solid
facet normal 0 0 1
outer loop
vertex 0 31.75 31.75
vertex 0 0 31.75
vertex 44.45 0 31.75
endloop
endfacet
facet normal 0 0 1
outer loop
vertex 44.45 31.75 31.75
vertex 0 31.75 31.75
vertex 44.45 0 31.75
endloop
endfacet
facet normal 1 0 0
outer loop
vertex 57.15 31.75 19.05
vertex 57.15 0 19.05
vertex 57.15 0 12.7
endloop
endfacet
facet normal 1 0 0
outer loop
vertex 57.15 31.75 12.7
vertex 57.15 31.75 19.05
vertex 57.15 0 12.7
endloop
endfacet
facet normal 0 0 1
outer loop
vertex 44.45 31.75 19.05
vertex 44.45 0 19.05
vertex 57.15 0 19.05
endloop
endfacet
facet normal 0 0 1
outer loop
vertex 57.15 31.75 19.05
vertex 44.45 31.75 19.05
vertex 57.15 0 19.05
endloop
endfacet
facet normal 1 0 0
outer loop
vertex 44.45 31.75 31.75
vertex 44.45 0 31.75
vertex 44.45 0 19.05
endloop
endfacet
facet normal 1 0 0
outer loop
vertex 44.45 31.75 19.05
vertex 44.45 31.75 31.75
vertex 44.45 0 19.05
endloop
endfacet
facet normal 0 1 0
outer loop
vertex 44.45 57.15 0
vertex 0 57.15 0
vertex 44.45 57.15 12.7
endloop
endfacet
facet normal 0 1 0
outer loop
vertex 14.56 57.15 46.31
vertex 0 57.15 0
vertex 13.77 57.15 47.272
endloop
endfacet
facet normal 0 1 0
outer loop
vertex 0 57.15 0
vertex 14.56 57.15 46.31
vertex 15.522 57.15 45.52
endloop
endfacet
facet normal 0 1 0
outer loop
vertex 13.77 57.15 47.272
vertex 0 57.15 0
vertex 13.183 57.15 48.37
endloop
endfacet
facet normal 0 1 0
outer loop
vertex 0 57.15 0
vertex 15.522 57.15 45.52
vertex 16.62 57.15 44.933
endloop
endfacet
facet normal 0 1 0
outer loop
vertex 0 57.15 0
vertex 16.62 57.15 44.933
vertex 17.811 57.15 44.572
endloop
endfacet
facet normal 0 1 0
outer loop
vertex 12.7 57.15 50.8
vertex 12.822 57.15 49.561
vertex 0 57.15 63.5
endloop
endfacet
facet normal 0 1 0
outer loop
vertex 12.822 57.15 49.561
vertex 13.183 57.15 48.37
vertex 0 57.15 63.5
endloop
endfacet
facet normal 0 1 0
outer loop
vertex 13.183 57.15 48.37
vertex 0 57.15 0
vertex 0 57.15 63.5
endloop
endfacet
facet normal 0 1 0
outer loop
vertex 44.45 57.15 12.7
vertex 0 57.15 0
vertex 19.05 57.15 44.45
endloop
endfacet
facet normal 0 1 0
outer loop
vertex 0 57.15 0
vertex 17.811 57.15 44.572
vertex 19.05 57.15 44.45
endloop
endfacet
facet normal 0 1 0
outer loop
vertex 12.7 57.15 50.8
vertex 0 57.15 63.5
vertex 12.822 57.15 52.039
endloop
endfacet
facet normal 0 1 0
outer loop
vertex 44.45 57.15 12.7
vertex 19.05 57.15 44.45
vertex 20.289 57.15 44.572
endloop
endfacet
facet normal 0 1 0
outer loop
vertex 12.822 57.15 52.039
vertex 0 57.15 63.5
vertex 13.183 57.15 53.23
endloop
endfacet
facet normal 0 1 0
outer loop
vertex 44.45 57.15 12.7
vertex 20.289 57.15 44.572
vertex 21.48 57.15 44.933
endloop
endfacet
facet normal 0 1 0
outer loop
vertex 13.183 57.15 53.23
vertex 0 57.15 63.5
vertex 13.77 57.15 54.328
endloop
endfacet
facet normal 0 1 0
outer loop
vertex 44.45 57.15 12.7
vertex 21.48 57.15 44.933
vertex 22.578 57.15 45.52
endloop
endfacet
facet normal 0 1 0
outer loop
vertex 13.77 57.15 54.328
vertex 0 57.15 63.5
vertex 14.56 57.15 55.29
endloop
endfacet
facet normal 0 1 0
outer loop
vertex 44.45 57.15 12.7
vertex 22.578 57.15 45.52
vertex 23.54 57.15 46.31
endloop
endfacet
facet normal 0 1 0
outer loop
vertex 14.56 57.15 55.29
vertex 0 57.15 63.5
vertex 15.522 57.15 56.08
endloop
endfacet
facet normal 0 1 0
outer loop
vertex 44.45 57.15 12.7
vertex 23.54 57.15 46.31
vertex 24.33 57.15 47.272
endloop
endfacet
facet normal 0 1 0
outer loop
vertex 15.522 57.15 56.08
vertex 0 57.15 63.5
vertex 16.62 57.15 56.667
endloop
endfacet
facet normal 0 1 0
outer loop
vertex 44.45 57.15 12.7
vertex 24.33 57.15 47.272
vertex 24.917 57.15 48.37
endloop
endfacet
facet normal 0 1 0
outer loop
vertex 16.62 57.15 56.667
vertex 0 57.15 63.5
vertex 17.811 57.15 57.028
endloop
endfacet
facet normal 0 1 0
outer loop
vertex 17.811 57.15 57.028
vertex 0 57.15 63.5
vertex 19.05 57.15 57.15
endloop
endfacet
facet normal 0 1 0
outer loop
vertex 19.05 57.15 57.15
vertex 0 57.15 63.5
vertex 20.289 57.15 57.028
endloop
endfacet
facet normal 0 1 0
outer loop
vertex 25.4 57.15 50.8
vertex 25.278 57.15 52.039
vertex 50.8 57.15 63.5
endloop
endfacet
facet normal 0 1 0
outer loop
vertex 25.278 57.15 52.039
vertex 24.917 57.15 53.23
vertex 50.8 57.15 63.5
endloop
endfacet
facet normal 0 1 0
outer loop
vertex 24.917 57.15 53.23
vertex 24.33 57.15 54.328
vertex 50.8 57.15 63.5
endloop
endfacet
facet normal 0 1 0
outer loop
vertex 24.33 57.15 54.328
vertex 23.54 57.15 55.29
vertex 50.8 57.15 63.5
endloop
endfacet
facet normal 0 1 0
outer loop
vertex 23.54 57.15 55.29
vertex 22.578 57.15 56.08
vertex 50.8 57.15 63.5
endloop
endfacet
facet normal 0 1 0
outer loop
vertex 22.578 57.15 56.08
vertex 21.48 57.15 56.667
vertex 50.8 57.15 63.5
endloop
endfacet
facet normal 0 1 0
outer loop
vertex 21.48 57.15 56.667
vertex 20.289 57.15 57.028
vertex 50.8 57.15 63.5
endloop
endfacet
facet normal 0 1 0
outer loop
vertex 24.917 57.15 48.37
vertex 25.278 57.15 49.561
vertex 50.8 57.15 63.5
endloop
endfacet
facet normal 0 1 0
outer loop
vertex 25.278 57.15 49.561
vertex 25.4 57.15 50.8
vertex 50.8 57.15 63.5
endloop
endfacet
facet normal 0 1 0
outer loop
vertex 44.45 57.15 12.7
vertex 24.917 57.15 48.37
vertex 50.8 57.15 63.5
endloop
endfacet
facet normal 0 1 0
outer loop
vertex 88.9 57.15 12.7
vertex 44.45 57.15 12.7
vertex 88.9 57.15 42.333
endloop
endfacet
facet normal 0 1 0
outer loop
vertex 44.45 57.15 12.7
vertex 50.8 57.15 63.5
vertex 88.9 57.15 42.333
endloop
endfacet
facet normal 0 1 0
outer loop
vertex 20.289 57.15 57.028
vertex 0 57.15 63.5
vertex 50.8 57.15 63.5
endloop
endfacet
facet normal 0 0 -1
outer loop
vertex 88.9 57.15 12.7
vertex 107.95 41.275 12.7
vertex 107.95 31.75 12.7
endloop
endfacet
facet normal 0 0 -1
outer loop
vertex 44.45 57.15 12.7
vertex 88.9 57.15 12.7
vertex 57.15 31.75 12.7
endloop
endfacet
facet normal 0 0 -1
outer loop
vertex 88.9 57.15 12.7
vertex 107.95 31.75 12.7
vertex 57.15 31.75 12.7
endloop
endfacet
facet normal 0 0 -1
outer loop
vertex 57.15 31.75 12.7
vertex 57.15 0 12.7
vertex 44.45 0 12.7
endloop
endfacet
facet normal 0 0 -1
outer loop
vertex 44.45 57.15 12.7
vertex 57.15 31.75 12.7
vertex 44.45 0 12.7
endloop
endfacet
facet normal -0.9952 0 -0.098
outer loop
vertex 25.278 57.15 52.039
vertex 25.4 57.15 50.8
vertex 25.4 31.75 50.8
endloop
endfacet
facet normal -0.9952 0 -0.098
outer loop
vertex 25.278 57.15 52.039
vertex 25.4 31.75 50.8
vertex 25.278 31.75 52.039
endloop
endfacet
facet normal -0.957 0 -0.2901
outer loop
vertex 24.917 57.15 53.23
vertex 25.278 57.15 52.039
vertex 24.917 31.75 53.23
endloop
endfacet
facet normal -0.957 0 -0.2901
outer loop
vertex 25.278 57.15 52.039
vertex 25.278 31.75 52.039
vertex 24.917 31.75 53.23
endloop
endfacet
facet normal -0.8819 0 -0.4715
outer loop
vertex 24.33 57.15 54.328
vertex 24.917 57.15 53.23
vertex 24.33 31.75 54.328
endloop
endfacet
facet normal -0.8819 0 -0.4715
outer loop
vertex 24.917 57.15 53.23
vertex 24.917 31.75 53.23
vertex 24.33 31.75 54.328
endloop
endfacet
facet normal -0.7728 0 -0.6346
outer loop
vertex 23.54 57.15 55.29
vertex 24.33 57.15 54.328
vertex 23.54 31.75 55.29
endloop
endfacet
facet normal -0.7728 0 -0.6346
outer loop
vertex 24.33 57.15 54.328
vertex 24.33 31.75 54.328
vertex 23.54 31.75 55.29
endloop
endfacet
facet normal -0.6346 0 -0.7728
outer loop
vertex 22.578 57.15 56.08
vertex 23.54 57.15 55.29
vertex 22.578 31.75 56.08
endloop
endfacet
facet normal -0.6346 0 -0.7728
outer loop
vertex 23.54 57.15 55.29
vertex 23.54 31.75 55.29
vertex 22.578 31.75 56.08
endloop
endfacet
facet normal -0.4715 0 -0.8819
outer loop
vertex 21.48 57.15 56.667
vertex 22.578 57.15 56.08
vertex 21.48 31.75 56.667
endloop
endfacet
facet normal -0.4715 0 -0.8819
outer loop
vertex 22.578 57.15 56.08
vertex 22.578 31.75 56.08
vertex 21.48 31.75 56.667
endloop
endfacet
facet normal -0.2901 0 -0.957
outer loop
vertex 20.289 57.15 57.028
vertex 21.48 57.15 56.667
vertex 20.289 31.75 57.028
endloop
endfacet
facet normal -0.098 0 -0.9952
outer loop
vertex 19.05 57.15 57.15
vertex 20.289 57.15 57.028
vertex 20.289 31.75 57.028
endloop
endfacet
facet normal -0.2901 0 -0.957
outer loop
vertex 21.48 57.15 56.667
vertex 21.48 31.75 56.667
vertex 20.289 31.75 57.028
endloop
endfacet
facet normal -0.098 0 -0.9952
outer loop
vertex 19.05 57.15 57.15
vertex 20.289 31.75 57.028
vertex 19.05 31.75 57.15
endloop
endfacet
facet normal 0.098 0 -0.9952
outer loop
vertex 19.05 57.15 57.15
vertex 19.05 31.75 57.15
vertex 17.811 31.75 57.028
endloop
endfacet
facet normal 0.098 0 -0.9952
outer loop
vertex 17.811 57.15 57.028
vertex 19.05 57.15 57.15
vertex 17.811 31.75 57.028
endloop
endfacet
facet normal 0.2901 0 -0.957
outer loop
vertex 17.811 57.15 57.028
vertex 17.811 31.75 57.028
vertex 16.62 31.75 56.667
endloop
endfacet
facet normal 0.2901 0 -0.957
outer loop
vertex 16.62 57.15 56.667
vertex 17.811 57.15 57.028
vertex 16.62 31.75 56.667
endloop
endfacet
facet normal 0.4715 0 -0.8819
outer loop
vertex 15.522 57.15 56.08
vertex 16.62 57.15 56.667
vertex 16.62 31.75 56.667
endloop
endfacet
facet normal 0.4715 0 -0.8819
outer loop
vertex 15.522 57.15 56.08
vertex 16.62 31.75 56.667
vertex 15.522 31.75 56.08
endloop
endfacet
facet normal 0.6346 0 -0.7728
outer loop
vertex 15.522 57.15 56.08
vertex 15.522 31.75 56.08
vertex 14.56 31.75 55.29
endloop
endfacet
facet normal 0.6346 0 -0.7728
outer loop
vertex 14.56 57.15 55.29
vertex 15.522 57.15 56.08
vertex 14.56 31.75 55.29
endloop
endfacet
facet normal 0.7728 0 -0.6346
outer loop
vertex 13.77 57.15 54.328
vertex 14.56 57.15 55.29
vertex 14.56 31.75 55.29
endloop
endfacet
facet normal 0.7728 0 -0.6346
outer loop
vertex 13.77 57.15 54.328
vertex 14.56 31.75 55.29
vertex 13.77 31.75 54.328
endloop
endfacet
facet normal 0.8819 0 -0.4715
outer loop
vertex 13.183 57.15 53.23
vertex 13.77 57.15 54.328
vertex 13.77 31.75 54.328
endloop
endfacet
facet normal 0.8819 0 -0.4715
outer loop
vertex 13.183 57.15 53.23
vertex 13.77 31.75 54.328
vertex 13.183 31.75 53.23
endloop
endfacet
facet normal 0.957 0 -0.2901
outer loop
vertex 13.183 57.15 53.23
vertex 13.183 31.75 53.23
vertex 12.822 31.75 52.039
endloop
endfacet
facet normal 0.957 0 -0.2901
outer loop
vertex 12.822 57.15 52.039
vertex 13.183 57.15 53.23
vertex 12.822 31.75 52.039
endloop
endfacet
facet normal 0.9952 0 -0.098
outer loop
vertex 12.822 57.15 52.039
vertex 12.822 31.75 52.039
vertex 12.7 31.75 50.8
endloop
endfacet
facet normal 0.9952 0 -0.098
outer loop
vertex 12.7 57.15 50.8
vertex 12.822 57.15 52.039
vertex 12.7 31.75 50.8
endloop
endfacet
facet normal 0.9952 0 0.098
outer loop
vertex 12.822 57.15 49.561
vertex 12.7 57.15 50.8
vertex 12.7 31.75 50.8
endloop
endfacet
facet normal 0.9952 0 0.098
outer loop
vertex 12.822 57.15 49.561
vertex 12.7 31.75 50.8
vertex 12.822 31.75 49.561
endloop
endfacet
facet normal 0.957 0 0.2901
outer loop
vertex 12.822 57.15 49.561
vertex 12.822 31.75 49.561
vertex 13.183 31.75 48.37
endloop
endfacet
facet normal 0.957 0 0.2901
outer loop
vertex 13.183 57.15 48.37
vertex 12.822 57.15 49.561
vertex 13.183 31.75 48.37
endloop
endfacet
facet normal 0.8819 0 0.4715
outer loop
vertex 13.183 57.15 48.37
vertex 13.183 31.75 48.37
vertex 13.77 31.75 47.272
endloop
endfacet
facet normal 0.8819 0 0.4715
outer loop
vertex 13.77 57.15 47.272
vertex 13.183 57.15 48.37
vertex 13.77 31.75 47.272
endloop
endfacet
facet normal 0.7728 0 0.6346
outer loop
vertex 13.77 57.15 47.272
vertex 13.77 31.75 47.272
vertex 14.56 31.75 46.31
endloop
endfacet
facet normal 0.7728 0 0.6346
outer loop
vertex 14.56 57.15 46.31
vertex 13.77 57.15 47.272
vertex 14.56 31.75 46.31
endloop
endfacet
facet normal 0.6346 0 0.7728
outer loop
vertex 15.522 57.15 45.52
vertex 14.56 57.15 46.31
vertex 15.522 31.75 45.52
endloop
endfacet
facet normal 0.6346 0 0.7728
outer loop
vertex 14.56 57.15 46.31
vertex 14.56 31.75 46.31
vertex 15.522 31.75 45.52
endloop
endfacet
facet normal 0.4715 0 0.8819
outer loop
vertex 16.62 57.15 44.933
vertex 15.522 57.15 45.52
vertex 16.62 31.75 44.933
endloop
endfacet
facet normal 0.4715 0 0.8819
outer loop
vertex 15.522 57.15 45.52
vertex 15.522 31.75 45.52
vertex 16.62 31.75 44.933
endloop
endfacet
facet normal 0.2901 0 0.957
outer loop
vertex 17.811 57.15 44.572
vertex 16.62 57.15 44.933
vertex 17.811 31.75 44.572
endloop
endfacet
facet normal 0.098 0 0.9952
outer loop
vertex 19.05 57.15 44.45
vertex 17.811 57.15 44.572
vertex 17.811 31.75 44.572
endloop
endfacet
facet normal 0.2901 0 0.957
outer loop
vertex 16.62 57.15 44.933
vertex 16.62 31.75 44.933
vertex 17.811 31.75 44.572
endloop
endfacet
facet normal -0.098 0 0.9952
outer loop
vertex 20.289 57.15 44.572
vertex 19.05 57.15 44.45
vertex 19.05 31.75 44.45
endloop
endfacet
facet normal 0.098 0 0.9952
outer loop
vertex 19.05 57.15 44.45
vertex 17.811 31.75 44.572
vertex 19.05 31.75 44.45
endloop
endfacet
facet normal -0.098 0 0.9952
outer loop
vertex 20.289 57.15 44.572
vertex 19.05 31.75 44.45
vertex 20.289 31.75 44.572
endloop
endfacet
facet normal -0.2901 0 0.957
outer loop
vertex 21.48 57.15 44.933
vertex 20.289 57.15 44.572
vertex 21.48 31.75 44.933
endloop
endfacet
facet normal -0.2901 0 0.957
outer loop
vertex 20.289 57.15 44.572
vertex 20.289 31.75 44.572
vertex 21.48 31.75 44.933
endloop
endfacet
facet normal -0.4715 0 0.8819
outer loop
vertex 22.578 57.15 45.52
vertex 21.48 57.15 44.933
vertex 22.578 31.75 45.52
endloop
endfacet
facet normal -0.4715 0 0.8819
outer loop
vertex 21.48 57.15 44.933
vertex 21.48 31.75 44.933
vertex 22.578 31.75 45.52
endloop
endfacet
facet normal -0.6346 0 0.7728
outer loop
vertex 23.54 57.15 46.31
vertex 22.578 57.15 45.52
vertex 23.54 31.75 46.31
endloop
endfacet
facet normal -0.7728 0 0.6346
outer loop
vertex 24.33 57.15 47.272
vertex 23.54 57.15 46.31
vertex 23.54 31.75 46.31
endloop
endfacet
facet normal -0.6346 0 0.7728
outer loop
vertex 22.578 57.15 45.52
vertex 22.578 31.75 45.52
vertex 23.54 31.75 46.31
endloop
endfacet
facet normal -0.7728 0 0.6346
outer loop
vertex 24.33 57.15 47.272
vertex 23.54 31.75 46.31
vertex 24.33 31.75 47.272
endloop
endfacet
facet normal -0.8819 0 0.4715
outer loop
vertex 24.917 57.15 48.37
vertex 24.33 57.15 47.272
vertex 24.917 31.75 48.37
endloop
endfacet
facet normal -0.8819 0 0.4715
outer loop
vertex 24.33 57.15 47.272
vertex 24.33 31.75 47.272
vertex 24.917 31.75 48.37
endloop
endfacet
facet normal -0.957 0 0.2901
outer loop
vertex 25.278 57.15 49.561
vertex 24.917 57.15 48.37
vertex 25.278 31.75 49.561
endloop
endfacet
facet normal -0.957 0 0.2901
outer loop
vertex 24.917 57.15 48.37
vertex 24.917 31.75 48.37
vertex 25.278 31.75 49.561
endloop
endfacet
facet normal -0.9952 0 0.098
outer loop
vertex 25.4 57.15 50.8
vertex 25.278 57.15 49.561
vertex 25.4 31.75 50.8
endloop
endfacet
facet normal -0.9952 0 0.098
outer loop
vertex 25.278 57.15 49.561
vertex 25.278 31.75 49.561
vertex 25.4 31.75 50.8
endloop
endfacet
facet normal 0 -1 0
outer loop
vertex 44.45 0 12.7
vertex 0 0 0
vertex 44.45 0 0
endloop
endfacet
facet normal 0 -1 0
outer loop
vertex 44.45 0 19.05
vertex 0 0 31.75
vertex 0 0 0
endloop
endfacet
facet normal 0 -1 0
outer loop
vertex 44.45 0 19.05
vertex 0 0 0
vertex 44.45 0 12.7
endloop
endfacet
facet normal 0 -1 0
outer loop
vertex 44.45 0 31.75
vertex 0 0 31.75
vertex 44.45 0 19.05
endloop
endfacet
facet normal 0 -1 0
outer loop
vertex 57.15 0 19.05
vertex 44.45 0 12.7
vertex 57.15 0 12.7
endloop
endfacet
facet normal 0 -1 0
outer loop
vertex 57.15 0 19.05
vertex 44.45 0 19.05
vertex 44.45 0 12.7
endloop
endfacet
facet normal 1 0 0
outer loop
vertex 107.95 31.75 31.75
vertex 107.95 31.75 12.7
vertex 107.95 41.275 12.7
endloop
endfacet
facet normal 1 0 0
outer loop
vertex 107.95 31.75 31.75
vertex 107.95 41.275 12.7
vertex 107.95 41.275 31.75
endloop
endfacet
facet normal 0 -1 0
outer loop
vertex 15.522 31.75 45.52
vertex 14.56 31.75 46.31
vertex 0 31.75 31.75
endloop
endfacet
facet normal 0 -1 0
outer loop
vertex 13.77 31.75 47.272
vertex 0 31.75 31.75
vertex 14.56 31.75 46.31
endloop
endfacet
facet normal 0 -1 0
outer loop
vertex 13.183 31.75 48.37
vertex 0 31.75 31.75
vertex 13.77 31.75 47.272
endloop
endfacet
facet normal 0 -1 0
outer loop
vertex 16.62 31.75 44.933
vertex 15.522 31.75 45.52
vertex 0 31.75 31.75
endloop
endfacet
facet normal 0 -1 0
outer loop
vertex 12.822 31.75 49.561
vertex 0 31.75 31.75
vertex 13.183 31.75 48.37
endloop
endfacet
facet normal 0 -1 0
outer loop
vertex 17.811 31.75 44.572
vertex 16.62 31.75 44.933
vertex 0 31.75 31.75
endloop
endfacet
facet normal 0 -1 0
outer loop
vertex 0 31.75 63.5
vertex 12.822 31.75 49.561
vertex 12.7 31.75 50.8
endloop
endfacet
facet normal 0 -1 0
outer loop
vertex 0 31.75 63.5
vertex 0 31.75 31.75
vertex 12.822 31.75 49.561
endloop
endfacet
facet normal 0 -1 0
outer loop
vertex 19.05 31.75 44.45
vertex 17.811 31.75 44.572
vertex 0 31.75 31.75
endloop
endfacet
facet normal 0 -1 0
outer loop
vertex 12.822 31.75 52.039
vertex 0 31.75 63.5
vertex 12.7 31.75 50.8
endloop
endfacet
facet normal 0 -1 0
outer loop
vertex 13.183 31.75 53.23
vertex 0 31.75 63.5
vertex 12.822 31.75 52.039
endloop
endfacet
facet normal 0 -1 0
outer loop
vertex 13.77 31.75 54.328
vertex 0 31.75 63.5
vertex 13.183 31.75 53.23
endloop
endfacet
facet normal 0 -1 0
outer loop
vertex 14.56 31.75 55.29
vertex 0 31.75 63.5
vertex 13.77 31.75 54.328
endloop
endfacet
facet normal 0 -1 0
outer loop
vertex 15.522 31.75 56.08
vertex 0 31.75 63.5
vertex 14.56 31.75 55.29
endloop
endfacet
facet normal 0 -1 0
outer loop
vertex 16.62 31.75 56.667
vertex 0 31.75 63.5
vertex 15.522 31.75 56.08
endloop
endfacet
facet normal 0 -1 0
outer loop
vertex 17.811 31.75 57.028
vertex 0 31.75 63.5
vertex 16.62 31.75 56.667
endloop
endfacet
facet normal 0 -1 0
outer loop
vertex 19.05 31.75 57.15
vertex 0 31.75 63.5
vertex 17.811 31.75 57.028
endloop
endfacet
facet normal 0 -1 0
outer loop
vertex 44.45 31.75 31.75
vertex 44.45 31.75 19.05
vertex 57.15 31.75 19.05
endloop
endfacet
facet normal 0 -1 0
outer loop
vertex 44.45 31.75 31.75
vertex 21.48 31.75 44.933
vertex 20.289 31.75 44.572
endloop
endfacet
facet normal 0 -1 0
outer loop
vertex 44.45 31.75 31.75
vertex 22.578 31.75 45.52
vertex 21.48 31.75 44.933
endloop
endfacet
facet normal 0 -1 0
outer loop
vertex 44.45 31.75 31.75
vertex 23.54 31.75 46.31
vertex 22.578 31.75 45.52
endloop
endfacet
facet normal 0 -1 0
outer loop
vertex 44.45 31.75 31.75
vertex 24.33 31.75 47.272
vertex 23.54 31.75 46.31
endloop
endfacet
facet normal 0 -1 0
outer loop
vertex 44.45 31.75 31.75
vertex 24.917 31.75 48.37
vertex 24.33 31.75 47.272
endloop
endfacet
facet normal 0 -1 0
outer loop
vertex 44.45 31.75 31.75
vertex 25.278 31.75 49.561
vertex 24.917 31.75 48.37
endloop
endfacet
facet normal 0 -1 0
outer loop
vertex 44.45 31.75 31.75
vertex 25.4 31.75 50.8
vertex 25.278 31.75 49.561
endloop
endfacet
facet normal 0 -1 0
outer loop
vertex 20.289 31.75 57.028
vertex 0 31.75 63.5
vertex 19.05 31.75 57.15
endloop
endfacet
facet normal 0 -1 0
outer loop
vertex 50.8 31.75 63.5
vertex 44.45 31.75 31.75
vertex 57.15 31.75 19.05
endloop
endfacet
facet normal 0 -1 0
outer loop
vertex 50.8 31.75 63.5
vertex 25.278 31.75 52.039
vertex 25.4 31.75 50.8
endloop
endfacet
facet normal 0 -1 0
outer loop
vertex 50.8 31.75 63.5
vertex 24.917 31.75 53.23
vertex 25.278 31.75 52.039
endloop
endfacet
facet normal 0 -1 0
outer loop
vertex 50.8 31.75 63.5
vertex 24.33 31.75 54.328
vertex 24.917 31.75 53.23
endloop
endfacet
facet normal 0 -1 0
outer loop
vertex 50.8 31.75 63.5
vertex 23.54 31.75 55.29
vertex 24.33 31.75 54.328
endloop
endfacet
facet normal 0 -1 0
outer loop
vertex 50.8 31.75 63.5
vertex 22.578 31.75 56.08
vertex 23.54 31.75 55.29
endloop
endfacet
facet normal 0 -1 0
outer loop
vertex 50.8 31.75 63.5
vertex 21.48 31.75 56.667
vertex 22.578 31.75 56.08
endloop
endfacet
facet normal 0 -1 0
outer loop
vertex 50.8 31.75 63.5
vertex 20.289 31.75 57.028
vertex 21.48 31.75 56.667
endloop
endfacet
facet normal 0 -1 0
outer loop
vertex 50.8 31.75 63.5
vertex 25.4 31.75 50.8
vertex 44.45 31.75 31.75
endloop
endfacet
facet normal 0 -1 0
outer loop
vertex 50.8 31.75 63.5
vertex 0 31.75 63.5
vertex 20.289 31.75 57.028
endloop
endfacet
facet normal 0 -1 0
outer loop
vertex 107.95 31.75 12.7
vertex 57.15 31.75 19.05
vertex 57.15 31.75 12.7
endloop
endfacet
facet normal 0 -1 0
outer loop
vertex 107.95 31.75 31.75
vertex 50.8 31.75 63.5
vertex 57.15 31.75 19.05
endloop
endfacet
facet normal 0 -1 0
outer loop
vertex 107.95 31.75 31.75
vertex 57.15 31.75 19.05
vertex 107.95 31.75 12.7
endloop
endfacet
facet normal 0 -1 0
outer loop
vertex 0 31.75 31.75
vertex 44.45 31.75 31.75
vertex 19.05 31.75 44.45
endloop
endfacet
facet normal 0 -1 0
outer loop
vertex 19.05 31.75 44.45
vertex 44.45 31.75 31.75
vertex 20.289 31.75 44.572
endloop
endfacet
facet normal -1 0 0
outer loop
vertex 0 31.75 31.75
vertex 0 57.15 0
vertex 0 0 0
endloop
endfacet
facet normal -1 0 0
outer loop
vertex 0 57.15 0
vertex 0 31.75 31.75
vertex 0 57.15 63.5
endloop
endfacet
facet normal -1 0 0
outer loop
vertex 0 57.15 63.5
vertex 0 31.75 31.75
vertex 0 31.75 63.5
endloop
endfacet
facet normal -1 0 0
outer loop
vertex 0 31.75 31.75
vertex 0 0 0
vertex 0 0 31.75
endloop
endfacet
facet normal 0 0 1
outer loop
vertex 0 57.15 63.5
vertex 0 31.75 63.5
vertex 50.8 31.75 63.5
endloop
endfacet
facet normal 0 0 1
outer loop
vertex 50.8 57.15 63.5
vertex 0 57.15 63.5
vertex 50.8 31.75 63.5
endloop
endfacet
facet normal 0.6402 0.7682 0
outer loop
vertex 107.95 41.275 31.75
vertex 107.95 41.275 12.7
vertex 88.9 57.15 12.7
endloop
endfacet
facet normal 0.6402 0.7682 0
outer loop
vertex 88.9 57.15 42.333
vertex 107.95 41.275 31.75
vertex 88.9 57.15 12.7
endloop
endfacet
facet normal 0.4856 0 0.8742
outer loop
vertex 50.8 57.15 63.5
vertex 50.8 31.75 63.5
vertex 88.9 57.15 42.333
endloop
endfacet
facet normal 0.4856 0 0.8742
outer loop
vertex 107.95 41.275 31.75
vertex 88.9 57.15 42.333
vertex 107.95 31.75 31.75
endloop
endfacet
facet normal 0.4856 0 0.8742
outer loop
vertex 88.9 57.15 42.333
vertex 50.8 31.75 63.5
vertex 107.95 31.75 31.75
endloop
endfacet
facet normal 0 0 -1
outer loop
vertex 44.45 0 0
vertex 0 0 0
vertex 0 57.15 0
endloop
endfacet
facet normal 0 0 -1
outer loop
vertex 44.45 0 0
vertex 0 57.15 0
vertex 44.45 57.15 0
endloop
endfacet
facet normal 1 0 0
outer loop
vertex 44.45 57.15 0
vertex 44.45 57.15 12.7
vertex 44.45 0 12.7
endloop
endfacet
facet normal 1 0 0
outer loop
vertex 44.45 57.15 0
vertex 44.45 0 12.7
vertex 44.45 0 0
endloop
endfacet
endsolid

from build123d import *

# Parameters (mm, degrees)
F0_W      = 107.95
F0_H      = 63.5
F1_DEPTH  = 57.15
F3_DEPTH  = 31.75
F4_W      = 63.5
F4_H      = 12.7
F5_DEPTH  = 25.401
F7_DEPTH  = 25.401
F9_DEPTH  = 25.401
F11_DEPTH = 50.801


with BuildPart() as f1:
    # F0 (on Front) → F1 (new body)
    with BuildSketch(Plane.XZ):
        with Locations((53.975, 31.75)):
            Rectangle(F0_W, F0_H)
    extrude(amount=-F1_DEPTH)

    # F2 (on face) → F3 (cut)
    with BuildSketch(Plane.XZ):
        Polygon((0, 63.5), (0, 31.75), (44.45, 31.75), (44.45, 19.05), (57.15, 19.05), (57.15, 12.7), (44.45, 12.7), (44.45, 0), (107.95, 0), (107.95, 63.5), align=None)
    extrude(amount=-F3_DEPTH, mode=Mode.SUBTRACT)

    # F4 (on face) → F5 (cut, through all)
    with BuildSketch(Plane.XZ.offset(-31.75)):
        with Locations((76.2, 6.35)):
            Rectangle(F4_W, F4_H)
    extrude(amount=-F5_DEPTH, mode=Mode.SUBTRACT)

    # F6 (on face) → F7 (cut, through all)
    with BuildSketch(Plane.XZ.offset(-31.75)):
        Polygon((50.8, 63.5), (107.95, 31.75), (107.95, 63.5), align=None)
    extrude(amount=-F7_DEPTH, mode=Mode.SUBTRACT)

    # F8 (on face) → F9 (cut, through all)
    with BuildSketch(Plane.XZ.offset(-31.75)):
        with BuildLine():
            ThreePointArc((12.7, 50.8), (19.05, 44.45), (25.4, 50.8))
            ThreePointArc((25.4, 50.8), (19.05, 57.15), (12.7, 50.8))
        make_face()
    extrude(amount=-F9_DEPTH, mode=Mode.SUBTRACT)

    # F10 (on face) → F11 (cut, through all)
    with BuildSketch(Plane(origin=(0, 0, 12.7), x_dir=(1, 0, 0), z_dir=(0, 0, -1))):
        Polygon((107.95, -57.15), (107.95, -41.275), (88.9, -57.15), align=None)
    extrude(amount=-F11_DEPTH, mode=Mode.SUBTRACT)


solid = f1.part
